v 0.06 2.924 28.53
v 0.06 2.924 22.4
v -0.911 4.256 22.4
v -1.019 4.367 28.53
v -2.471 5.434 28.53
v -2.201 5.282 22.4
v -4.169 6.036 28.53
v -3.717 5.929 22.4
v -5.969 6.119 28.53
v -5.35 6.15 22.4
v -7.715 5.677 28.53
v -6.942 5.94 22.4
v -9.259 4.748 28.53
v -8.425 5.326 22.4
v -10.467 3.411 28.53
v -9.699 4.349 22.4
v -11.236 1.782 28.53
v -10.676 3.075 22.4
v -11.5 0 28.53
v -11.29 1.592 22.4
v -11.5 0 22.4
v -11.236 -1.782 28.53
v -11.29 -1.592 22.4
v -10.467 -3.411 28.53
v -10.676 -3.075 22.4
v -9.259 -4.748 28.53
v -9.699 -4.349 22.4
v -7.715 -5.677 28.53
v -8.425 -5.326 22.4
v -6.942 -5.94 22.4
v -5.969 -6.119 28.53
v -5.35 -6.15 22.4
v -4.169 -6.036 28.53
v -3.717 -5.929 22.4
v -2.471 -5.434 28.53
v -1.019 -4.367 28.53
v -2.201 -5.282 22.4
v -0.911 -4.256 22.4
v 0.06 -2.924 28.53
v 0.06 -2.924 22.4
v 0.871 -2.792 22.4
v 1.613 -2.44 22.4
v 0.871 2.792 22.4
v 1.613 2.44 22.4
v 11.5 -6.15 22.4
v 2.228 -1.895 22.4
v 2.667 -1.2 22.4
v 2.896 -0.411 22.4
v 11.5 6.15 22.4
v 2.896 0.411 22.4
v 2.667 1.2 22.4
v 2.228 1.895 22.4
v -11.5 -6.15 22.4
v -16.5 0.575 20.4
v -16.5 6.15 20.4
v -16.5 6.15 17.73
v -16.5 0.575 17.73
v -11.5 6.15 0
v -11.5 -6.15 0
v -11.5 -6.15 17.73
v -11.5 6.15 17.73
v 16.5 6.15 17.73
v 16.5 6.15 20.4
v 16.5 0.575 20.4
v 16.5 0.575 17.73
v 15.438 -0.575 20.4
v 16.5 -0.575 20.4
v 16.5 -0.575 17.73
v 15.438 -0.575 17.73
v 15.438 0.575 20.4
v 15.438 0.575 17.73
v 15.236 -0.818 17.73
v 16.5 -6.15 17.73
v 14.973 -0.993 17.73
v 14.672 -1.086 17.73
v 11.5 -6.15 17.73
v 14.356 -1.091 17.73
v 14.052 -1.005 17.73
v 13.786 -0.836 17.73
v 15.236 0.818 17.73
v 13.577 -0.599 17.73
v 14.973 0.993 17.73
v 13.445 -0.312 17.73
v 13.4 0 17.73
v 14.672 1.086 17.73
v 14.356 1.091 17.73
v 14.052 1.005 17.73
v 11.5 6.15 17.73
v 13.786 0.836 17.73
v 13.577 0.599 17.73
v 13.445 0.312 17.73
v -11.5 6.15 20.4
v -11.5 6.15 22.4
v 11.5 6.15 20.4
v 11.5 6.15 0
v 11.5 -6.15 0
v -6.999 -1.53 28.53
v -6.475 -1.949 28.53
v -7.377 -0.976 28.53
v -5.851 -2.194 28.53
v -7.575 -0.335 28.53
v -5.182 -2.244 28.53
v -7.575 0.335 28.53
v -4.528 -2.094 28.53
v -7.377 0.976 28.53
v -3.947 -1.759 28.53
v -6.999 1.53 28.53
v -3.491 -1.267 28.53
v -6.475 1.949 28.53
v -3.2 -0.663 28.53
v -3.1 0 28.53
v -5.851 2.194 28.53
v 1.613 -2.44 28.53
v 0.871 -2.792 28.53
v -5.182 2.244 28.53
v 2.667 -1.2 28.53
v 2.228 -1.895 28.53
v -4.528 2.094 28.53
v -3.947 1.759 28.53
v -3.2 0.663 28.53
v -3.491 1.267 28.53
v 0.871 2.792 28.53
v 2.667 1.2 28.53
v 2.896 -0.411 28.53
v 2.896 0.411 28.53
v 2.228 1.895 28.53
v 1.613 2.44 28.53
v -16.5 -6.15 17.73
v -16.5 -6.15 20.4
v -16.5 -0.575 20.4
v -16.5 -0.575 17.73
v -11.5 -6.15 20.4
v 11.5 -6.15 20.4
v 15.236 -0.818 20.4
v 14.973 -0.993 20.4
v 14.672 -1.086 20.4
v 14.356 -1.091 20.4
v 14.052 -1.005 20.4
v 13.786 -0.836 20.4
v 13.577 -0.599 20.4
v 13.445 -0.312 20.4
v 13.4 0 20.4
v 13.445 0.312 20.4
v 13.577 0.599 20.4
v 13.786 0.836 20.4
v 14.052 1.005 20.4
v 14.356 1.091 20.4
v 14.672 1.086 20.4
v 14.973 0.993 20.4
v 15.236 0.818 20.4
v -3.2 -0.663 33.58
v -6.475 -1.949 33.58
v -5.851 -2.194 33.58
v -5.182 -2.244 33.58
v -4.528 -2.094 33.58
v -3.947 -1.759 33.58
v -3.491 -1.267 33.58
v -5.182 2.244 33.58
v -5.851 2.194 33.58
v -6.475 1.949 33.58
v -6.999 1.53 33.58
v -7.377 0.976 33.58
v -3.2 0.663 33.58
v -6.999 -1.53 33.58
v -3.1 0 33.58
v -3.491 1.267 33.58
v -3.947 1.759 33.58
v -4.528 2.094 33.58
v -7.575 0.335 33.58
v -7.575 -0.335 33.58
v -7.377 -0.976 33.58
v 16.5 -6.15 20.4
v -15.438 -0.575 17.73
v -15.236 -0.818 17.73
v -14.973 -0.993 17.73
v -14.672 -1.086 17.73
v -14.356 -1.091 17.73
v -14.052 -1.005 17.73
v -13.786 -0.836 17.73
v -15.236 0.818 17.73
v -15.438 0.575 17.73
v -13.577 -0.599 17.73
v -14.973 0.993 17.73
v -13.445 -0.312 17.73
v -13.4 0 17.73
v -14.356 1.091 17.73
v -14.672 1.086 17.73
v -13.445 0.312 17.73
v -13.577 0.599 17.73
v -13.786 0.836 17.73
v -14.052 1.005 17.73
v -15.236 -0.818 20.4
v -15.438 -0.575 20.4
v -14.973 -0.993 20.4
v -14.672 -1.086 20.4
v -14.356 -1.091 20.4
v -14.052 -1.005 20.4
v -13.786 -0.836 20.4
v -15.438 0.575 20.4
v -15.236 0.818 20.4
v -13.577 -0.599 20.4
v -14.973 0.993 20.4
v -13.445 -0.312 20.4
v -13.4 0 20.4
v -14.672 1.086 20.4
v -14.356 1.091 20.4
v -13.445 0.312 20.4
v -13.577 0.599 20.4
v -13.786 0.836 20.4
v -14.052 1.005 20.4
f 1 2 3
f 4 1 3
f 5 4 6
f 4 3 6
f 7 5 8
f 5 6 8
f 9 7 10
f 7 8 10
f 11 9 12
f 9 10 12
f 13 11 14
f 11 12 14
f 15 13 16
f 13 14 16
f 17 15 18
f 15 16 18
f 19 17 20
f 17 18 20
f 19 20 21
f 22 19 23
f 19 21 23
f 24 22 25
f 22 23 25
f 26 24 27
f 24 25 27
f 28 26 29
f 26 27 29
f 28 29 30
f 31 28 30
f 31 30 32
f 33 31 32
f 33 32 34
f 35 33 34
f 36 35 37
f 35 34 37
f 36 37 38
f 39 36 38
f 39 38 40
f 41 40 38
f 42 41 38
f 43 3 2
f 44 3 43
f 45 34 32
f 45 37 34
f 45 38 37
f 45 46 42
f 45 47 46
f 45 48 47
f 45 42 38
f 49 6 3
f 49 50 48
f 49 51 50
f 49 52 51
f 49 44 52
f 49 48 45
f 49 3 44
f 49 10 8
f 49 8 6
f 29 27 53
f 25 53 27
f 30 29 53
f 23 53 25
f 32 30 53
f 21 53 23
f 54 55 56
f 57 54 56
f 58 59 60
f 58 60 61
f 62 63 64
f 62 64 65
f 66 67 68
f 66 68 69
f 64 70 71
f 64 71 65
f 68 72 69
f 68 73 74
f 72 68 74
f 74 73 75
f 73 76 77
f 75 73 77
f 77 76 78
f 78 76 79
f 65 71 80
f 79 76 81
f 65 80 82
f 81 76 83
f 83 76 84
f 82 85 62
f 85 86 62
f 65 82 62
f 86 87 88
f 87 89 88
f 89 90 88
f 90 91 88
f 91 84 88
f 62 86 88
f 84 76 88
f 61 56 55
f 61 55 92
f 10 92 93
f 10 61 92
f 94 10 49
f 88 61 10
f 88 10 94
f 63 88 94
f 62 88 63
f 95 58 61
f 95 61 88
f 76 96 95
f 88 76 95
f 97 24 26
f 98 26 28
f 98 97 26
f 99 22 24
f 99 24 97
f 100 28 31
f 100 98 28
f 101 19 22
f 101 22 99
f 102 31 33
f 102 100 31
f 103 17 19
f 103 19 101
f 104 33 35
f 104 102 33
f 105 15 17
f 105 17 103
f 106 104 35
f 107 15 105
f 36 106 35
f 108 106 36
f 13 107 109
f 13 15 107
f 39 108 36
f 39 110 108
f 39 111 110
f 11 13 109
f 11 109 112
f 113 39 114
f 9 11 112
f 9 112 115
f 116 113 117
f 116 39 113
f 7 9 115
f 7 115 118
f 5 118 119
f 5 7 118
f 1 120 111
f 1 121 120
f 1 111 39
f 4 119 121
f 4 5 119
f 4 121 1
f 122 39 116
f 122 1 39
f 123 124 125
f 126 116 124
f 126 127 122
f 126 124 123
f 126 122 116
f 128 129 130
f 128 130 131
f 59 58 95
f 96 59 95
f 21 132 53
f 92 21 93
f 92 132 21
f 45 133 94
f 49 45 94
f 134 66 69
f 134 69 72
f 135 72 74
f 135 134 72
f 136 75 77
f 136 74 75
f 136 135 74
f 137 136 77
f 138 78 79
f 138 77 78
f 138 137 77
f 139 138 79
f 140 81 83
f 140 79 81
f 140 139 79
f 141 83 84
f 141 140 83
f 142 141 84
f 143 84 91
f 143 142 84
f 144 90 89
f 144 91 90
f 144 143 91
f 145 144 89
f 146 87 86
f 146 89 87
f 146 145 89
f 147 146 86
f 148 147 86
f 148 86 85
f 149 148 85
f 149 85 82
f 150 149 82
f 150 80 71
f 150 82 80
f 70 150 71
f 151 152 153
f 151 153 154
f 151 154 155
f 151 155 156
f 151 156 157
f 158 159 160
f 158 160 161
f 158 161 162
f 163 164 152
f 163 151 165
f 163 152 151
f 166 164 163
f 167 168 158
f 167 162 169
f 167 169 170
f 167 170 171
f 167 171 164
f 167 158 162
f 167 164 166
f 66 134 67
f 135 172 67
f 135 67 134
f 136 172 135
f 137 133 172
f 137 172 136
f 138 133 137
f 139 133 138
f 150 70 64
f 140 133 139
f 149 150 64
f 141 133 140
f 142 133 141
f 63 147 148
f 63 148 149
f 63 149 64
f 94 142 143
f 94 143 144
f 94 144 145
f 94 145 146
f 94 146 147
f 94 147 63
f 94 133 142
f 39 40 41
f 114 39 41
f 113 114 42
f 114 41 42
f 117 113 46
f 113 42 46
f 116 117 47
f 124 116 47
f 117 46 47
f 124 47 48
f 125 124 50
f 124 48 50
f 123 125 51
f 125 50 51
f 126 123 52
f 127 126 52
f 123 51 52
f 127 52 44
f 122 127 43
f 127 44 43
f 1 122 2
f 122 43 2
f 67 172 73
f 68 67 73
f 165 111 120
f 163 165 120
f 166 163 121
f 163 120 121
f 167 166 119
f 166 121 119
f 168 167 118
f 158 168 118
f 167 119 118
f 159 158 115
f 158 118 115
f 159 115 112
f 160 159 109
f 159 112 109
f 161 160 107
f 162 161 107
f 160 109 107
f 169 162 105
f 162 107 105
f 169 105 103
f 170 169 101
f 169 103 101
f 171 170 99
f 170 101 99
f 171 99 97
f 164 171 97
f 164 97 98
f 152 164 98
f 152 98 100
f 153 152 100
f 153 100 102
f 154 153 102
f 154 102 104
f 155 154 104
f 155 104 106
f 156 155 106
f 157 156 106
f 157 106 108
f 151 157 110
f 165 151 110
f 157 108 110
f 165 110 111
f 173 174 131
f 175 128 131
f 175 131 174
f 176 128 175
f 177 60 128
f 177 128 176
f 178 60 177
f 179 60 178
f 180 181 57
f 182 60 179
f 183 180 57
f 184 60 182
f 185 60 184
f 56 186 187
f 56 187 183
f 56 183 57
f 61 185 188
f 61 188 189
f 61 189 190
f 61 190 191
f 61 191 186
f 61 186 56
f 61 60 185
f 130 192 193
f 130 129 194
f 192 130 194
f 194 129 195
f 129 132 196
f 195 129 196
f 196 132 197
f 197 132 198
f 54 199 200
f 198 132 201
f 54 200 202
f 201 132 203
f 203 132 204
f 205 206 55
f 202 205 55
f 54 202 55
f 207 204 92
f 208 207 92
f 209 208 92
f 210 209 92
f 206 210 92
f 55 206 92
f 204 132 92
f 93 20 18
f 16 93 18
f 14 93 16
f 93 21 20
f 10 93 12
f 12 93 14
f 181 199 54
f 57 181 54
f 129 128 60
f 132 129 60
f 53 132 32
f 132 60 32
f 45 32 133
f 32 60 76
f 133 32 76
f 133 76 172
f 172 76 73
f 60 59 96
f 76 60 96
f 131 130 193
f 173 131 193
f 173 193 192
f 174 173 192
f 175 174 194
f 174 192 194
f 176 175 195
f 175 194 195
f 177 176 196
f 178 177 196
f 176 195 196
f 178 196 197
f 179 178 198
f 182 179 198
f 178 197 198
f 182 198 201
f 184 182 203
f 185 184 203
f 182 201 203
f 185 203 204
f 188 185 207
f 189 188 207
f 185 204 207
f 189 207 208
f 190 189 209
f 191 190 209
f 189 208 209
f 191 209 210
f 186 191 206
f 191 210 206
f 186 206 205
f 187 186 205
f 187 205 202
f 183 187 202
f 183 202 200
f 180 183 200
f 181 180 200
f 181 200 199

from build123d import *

# Parameters (mm, degrees)
SKETCH2_W           = 23
SKETCH2_H           = 12.3
BOSS_EXTRUDE1_DEPTH = 22.4
SKETCH3_W           = 2.67
SKETCH3_H           = 12.3
BOSS_EXTRUDE2_DEPTH = 5
CUT_EXTRUDE1_DEPTH  = 27.948701267
BOSS_EXTRUDE3_DEPTH = 6.13
SKETCH5_R           = 2.25
BOSS_EXTRUDE4_DEPTH = 5.05


with BuildPart() as part:
    # Sketch2 → Boss-Extrude1 (new body)
    with BuildSketch(Plane.XY):
        Rectangle(SKETCH2_W, SKETCH2_H)
    extrude(amount=BOSS_EXTRUDE1_DEPTH)

    # Sketch3 → Boss-Extrude2 (add)
    with BuildSketch(Plane(origin=(11.5, 0, 0), x_dir=(0, 0, -1), z_dir=(1, 0, 0))):
        with Locations((-19.065, 0)):
            Rectangle(SKETCH3_W, SKETCH3_H)
    boss_extrude2 = extrude(amount=BOSS_EXTRUDE2_DEPTH)

    # Sketch6 → Cut-Extrude1 (cut, through all)
    with BuildSketch(Plane.XY.offset(20.4)):
        with BuildLine():
            Line((15.437749967, 0.575), (16.5, 0.575))
            Line((16.5, 0.575), (16.5, -0.575))
            Line((16.5, -0.575), (15.437749967, -0.575))
            ThreePointArc((15.437749967, -0.575), (13.4, 0), (15.437749967, 0.575))
        make_face()
    cut_extrude1 = extrude(amount=-CUT_EXTRUDE1_DEPTH, mode=Mode.SUBTRACT)

    # Mirror1: Boss-Extrude2, Cut-Extrude1 across plane
    add(boss_extrude2.mirror(Plane(origin=(0, 0, 0), x_dir=(0, 0, 1), z_dir=(1, 0, 0))))
    add(cut_extrude1.mirror(Plane(origin=(0, 0, 0), x_dir=(0, 0, 1), z_dir=(1, 0, 0))), mode=Mode.SUBTRACT)

    # Sketch4 → Boss-Extrude3 (add)
    with BuildSketch(Plane.XY.offset(22.4)):
        with BuildLine():
            ThreePointArc((0.060221963, 2.924379988), (-11.5, 0), (0.060221963, -2.924379988))
            ThreePointArc((0.060221963, -2.924379988), (2.925, 0), (0.060221963, 2.924379988))
        make_face()
    extrude(amount=BOSS_EXTRUDE3_DEPTH)

    # Sketch5 → Boss-Extrude4 (add)
    with BuildSketch(Plane.XY.offset(28.53)):
        with Locations((-5.35, 0)):
            Circle(SKETCH5_R)
    extrude(amount=BOSS_EXTRUDE4_DEPTH)


solid = part.part
